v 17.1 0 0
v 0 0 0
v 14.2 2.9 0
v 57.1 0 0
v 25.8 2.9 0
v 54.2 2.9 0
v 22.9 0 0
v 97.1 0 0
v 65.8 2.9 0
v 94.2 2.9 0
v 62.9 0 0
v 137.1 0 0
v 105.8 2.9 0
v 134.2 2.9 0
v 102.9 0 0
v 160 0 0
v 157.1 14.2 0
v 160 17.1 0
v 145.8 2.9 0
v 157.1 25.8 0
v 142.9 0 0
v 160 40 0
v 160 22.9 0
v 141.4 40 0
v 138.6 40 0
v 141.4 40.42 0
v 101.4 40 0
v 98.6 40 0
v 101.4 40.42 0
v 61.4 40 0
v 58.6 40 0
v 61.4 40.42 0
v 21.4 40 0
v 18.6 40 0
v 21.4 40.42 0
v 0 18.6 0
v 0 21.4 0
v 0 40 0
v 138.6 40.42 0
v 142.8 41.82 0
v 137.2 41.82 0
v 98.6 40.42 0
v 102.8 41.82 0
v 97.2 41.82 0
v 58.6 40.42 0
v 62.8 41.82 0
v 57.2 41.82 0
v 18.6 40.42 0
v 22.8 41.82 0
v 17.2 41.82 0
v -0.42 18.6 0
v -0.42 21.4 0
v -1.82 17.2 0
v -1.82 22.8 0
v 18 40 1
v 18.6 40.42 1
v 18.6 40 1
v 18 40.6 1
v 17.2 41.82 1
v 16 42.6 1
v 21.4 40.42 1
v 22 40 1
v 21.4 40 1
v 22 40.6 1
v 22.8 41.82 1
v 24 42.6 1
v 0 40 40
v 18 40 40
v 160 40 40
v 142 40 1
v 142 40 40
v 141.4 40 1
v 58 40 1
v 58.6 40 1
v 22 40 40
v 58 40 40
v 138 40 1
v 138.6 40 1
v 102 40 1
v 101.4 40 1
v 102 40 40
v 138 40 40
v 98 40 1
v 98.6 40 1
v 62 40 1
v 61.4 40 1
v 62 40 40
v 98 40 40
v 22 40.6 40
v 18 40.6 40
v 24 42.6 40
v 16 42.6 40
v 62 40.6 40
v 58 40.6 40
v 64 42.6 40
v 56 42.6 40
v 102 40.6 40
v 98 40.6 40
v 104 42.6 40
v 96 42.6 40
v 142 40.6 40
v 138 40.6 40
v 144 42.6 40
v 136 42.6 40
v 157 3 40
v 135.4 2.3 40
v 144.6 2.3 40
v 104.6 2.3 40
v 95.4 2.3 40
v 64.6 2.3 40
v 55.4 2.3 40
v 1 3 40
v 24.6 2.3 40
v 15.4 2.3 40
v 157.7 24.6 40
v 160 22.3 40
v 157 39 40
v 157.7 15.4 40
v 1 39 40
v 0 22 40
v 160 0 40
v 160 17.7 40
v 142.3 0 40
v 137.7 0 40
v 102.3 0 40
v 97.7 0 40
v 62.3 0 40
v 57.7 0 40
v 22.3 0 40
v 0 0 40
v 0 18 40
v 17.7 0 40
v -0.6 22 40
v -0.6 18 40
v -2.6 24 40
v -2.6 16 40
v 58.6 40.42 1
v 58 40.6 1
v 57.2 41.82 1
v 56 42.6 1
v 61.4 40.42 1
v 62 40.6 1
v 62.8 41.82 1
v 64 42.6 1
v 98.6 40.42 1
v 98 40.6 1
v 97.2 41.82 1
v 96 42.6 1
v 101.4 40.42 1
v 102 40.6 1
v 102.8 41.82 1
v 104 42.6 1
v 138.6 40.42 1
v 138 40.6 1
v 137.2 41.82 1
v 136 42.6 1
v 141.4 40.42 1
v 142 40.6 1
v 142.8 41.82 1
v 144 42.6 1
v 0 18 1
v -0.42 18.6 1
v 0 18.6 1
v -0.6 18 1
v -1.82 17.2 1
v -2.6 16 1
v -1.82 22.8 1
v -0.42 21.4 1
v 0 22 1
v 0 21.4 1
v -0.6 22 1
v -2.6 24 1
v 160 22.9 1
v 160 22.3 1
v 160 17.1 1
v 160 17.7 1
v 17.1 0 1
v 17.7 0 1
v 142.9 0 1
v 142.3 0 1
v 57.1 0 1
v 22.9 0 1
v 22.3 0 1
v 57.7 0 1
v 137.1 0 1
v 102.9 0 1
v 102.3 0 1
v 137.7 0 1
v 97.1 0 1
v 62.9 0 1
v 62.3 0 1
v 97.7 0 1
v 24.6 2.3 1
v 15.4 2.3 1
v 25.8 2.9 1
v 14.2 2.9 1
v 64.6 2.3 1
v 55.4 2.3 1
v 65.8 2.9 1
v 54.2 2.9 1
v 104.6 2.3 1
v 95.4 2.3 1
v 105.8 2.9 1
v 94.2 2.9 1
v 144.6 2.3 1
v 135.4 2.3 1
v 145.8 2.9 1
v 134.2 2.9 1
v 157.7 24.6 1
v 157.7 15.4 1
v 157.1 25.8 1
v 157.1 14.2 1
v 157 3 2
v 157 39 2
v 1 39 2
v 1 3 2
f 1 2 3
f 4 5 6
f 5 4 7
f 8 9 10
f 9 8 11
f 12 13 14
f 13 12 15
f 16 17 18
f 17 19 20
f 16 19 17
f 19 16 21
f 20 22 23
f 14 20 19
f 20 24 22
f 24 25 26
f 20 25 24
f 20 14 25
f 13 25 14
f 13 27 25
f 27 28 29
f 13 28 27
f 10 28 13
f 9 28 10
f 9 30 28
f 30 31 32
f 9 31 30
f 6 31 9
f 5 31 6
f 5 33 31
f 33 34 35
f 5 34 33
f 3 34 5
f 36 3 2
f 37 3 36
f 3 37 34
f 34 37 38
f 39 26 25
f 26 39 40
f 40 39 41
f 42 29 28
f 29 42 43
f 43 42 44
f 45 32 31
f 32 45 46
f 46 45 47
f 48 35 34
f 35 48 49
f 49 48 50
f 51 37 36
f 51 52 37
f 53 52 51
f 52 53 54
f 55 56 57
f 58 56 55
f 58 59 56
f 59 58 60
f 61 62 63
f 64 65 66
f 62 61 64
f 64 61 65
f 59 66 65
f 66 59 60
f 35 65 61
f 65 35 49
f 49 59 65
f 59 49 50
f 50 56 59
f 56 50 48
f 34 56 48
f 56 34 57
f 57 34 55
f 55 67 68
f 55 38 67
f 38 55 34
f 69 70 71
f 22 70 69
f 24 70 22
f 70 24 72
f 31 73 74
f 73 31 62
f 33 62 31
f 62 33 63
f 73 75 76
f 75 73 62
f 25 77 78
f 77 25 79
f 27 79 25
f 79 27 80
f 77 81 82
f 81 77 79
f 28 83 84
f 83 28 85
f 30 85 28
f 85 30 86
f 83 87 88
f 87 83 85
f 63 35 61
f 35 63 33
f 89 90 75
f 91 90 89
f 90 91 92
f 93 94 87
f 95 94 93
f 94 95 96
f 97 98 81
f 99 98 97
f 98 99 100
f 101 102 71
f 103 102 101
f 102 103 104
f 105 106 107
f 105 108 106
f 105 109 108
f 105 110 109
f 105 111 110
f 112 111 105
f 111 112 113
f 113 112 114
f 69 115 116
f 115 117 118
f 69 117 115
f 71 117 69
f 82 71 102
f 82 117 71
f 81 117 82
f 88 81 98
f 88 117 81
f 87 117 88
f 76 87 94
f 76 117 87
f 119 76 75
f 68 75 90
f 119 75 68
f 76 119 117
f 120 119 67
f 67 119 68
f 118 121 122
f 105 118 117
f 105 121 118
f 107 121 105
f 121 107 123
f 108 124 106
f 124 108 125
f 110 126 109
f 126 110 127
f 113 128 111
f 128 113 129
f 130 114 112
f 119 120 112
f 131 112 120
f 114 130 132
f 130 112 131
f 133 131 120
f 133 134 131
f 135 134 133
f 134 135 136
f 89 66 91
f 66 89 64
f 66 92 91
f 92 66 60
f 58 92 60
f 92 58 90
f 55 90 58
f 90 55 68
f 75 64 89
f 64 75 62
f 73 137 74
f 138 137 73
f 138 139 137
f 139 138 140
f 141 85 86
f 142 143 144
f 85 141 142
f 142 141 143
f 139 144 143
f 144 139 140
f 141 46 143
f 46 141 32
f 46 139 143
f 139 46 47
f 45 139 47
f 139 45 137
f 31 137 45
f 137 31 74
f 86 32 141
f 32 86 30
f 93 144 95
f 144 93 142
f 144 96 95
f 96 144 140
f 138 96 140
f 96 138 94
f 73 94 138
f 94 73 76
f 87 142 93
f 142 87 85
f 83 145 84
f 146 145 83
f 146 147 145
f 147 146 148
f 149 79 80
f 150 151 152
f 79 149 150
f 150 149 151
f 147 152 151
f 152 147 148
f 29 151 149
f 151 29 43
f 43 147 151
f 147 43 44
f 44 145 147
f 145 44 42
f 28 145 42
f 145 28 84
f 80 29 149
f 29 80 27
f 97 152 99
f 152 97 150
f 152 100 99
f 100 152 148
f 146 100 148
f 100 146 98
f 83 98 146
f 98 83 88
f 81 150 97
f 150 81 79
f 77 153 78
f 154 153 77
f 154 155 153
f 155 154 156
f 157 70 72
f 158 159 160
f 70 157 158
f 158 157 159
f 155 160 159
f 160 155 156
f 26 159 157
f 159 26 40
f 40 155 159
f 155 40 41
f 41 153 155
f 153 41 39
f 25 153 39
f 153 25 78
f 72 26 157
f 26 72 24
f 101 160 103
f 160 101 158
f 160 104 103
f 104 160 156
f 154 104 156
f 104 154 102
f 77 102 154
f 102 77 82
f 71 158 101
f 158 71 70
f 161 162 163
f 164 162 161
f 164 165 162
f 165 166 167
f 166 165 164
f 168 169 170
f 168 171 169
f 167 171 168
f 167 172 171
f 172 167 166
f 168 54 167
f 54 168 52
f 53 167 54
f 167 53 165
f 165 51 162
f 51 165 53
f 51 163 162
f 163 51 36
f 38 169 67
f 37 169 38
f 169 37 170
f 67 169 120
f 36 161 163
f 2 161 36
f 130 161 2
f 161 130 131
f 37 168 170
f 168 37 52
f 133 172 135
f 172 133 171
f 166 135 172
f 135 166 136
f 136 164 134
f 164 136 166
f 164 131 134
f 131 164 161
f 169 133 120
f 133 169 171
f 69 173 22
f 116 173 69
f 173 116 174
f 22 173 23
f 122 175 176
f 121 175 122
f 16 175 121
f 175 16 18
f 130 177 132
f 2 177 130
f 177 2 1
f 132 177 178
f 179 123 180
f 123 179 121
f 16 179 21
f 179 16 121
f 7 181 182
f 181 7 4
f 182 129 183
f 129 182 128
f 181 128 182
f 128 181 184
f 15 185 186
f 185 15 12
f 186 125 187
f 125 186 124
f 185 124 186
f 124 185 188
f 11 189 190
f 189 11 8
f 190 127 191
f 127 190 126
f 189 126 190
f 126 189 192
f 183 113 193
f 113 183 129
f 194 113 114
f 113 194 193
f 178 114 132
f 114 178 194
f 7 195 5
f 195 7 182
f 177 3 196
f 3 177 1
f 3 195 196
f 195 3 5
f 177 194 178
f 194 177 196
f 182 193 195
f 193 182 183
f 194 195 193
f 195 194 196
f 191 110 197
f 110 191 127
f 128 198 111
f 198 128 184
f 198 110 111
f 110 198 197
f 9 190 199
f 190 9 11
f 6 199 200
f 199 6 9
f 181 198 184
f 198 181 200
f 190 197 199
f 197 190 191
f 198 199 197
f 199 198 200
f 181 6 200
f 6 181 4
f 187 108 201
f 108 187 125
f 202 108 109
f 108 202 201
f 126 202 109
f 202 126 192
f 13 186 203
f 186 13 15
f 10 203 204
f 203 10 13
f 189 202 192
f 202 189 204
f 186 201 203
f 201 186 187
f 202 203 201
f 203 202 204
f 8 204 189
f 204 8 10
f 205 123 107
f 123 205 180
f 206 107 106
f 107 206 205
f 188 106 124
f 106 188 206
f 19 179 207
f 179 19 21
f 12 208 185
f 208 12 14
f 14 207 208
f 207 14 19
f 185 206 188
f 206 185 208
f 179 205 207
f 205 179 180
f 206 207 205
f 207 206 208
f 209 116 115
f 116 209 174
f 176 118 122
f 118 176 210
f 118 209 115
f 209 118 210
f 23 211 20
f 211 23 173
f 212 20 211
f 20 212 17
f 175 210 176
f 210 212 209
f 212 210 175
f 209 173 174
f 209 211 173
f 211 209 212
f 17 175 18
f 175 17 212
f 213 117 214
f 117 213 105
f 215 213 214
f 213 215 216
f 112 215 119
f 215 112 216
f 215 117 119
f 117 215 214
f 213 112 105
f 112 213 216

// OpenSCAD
echo(version=version(2.0));
//comments: Version 2 adds anti-"elephant foot" scaling at bottom of dovetail sections
/* [Size] */
//Box unit size in mm. This defines the size of 1 'unit' for your box.
BoxUnits = 40;
//Box Width in units
BoxWidthUnits = 1;
BoxWidth = BoxWidthUnits * BoxUnits;
//Box Length in units
BoxLengthUnits = 4;
BoxLength = BoxLengthUnits * BoxUnits;
//Box Height in mm
BoxHeight = 40;
//Box Wall Thickness in mm
BoxWall = 1;
//Box Floor Thickness in mm
BoxFloor = 2;
//Fit Factor. Greater factor = looser fit
FitFactor = 0.15;  // [0:0.05:0.4]

/* [Walls] */
//North Wall open or closed
NorthWallOpen = 0; // [0:Closed, 1:Open]
//South Wall open or closed
SouthWallOpen = 0; // [0:Closed, 1:Open]

/* [Dovetail] */
//Dovetail inside length in mm
DTInsideLength = 4;
//Dovetail angle in degrees
DTAngle = 45;
//Dovetail width in mm
DTWidth = 2;

/* [Hidden] */
//This helps calculate the length of the 'long' side of the dovetail
DTx=tan(DTAngle)*DTWidth;
//This polygon defines the dovetail shape
DTShape = [[0,0],[DTInsideLength/2,0],[DTInsideLength/2+DTx,DTWidth],[-DTInsideLength/2-DTx,DTWidth],[-DTInsideLength/2,0]];

difference(){
    
union(){
    //main box
cube([BoxLength,BoxWidth,BoxHeight], center=false);

    //male dovetails
for (i=[1:BoxLengthUnits])
translate([(i-1)*BoxUnits+(BoxUnits/2),BoxWidth,0])
	//in 2 sections. first section is slightly scaled down to counter "elephant foot"
	union(){
		linear_extrude(height=1, center=false)
	        scale([1-(2*FitFactor),1-(2*FitFactor),1])
			union(){        
				//this adds a slight offset to the male dovetail for a looser fit
	            translate([-DTInsideLength/2,0,0])
	            square([DTInsideLength,DTWidth]);
	            //main dovetail shape
	            translate([0,DTWidth*FitFactor*2,0])
	            polygon(DTShape);
	        };
		translate([0,0,1])
		linear_extrude(height=BoxHeight-1, center=false)
        		union(){
	            //this adds a slight offset to the male dovetail for a looser fit
	            translate([-DTInsideLength/2,0,0])
	            square([DTInsideLength,DTWidth]);
	            //main dovetail shape
	            translate([0,DTWidth*FitFactor*2,0])
	            polygon(DTShape);
        		};
	}        

for (i=[1:BoxWidthUnits])
translate([0,(i-1)*BoxUnits+(BoxUnits/2),0])
    //in 2 sections. first section is slightly scaled down to counter "elephant foot"
	rotate([0,0,90])
	union(){
		linear_extrude(height=1, center=false)				//1mm high anti-elephant foot section
	        scale([1-(2*FitFactor),1-(2*FitFactor),1])
			union(){        
				//this adds a slight offset to the male dovetail for a looser fit
	            translate([-DTInsideLength/2,0,0])
	            square([DTInsideLength,DTWidth]);
	            //main dovetail shape
	            translate([0,DTWidth*FitFactor*2,0])
	            polygon(DTShape);
	        };
	    translate([0,0,1])
		linear_extrude(height=BoxHeight-1, center=false)
	        union(){
	            //male dovetail offset
	            translate([-DTInsideLength/2,0,0])
	            square([DTInsideLength,DTWidth]);
	            //main dovetail shape
	            translate([0,DTWidth*FitFactor*2,0])
	            polygon(DTShape);
	        };
	}
}
//female dovetails
for (i=[1:BoxLengthUnits])
	union(){
		translate([(i-1)*BoxUnits+(BoxUnits/2),0,0])
		    scale([1+FitFactor,1+FitFactor,1])
		    linear_extrude(height=BoxHeight, center=false)
		    polygon(DTShape);
	
		//added a second dovetail cutout at the bottom, scaled up to counter "elephant foot" when printed
		translate([(i-1)*BoxUnits+(BoxUnits/2),0,0])
		    scale([1+(3*FitFactor),1+(3*FitFactor),1])
		    linear_extrude(height=1, center=false)
		    polygon(DTShape);					
	}

for (i=[1:BoxWidthUnits])
	union(){
		translate([BoxLength,(i-1)*BoxUnits+(BoxUnits/2),0])
		    rotate([0,0,90])
		        scale([1+FitFactor,1+FitFactor,1])
		            linear_extrude(height=BoxHeight, center=false)
		                polygon(DTShape);
		//added a second dovetail cutout at the bottom, scaled up to counter "elephant foot" when printed
		translate([BoxLength,(i-1)*BoxUnits+(BoxUnits/2),0])
		    rotate([0,0,90])
		        scale([1+(3*FitFactor),1+(3*FitFactor),1])
		            linear_extrude(height=1, center=false)
		                polygon(DTShape);	
	}
//carves out main box
translate([BoxWall,DTWidth+BoxWall,BoxFloor], center=false)
    cube([BoxLength-(2*BoxWall)-DTWidth, (BoxWidth-(2*BoxWall)-DTWidth), BoxHeight]);

if (NorthWallOpen)
    translate([-DTWidth*(1+FitFactor+FitFactor),BoxWall+DTWidth,BoxFloor], center=false)
        cube([BoxWall+(DTWidth*(1+FitFactor+FitFactor)), (BoxWidth-(2*BoxWall)-DTWidth), BoxHeight]);    

if (SouthWallOpen)
    translate([BoxLength-(BoxWall)-DTWidth,BoxWall+DTWidth,BoxFloor], center=false)
        cube([BoxWall+DTWidth, (BoxWidth-(2*BoxWall)-DTWidth), BoxHeight]);


}

//
/*
difference(){
    linear_extrude(height=h)
        offset(r=5)
        offset(r=-5)
        polygon(Poly1);

    linear_extrude(height=h)
        offset(r=5)
        offset(r=-10)
        polygon(Poly1);

    translate([w2,0,0])
    rotate([0,-90,0])
    linear_extrude(height=BackWidth)
        polygon(Poly2);
    
    for (a =[0:NumSlots-1])
     translate([0, FrontOffset+Slot1+(a*SlotSpacing)+(0*SlotSizeStep), BottomOffset +((a)*tan(SlotBottomSlope)*SlotSpacing)])
        rotate([-SlotAngle,0,0])
            translate([-(BackWidth/2),-(Slot1+a*SlotSizeStep),0])
            cube([BackWidth,Slot1+(a*SlotSizeStep),SlotDepth], center=false); 
}
*/
